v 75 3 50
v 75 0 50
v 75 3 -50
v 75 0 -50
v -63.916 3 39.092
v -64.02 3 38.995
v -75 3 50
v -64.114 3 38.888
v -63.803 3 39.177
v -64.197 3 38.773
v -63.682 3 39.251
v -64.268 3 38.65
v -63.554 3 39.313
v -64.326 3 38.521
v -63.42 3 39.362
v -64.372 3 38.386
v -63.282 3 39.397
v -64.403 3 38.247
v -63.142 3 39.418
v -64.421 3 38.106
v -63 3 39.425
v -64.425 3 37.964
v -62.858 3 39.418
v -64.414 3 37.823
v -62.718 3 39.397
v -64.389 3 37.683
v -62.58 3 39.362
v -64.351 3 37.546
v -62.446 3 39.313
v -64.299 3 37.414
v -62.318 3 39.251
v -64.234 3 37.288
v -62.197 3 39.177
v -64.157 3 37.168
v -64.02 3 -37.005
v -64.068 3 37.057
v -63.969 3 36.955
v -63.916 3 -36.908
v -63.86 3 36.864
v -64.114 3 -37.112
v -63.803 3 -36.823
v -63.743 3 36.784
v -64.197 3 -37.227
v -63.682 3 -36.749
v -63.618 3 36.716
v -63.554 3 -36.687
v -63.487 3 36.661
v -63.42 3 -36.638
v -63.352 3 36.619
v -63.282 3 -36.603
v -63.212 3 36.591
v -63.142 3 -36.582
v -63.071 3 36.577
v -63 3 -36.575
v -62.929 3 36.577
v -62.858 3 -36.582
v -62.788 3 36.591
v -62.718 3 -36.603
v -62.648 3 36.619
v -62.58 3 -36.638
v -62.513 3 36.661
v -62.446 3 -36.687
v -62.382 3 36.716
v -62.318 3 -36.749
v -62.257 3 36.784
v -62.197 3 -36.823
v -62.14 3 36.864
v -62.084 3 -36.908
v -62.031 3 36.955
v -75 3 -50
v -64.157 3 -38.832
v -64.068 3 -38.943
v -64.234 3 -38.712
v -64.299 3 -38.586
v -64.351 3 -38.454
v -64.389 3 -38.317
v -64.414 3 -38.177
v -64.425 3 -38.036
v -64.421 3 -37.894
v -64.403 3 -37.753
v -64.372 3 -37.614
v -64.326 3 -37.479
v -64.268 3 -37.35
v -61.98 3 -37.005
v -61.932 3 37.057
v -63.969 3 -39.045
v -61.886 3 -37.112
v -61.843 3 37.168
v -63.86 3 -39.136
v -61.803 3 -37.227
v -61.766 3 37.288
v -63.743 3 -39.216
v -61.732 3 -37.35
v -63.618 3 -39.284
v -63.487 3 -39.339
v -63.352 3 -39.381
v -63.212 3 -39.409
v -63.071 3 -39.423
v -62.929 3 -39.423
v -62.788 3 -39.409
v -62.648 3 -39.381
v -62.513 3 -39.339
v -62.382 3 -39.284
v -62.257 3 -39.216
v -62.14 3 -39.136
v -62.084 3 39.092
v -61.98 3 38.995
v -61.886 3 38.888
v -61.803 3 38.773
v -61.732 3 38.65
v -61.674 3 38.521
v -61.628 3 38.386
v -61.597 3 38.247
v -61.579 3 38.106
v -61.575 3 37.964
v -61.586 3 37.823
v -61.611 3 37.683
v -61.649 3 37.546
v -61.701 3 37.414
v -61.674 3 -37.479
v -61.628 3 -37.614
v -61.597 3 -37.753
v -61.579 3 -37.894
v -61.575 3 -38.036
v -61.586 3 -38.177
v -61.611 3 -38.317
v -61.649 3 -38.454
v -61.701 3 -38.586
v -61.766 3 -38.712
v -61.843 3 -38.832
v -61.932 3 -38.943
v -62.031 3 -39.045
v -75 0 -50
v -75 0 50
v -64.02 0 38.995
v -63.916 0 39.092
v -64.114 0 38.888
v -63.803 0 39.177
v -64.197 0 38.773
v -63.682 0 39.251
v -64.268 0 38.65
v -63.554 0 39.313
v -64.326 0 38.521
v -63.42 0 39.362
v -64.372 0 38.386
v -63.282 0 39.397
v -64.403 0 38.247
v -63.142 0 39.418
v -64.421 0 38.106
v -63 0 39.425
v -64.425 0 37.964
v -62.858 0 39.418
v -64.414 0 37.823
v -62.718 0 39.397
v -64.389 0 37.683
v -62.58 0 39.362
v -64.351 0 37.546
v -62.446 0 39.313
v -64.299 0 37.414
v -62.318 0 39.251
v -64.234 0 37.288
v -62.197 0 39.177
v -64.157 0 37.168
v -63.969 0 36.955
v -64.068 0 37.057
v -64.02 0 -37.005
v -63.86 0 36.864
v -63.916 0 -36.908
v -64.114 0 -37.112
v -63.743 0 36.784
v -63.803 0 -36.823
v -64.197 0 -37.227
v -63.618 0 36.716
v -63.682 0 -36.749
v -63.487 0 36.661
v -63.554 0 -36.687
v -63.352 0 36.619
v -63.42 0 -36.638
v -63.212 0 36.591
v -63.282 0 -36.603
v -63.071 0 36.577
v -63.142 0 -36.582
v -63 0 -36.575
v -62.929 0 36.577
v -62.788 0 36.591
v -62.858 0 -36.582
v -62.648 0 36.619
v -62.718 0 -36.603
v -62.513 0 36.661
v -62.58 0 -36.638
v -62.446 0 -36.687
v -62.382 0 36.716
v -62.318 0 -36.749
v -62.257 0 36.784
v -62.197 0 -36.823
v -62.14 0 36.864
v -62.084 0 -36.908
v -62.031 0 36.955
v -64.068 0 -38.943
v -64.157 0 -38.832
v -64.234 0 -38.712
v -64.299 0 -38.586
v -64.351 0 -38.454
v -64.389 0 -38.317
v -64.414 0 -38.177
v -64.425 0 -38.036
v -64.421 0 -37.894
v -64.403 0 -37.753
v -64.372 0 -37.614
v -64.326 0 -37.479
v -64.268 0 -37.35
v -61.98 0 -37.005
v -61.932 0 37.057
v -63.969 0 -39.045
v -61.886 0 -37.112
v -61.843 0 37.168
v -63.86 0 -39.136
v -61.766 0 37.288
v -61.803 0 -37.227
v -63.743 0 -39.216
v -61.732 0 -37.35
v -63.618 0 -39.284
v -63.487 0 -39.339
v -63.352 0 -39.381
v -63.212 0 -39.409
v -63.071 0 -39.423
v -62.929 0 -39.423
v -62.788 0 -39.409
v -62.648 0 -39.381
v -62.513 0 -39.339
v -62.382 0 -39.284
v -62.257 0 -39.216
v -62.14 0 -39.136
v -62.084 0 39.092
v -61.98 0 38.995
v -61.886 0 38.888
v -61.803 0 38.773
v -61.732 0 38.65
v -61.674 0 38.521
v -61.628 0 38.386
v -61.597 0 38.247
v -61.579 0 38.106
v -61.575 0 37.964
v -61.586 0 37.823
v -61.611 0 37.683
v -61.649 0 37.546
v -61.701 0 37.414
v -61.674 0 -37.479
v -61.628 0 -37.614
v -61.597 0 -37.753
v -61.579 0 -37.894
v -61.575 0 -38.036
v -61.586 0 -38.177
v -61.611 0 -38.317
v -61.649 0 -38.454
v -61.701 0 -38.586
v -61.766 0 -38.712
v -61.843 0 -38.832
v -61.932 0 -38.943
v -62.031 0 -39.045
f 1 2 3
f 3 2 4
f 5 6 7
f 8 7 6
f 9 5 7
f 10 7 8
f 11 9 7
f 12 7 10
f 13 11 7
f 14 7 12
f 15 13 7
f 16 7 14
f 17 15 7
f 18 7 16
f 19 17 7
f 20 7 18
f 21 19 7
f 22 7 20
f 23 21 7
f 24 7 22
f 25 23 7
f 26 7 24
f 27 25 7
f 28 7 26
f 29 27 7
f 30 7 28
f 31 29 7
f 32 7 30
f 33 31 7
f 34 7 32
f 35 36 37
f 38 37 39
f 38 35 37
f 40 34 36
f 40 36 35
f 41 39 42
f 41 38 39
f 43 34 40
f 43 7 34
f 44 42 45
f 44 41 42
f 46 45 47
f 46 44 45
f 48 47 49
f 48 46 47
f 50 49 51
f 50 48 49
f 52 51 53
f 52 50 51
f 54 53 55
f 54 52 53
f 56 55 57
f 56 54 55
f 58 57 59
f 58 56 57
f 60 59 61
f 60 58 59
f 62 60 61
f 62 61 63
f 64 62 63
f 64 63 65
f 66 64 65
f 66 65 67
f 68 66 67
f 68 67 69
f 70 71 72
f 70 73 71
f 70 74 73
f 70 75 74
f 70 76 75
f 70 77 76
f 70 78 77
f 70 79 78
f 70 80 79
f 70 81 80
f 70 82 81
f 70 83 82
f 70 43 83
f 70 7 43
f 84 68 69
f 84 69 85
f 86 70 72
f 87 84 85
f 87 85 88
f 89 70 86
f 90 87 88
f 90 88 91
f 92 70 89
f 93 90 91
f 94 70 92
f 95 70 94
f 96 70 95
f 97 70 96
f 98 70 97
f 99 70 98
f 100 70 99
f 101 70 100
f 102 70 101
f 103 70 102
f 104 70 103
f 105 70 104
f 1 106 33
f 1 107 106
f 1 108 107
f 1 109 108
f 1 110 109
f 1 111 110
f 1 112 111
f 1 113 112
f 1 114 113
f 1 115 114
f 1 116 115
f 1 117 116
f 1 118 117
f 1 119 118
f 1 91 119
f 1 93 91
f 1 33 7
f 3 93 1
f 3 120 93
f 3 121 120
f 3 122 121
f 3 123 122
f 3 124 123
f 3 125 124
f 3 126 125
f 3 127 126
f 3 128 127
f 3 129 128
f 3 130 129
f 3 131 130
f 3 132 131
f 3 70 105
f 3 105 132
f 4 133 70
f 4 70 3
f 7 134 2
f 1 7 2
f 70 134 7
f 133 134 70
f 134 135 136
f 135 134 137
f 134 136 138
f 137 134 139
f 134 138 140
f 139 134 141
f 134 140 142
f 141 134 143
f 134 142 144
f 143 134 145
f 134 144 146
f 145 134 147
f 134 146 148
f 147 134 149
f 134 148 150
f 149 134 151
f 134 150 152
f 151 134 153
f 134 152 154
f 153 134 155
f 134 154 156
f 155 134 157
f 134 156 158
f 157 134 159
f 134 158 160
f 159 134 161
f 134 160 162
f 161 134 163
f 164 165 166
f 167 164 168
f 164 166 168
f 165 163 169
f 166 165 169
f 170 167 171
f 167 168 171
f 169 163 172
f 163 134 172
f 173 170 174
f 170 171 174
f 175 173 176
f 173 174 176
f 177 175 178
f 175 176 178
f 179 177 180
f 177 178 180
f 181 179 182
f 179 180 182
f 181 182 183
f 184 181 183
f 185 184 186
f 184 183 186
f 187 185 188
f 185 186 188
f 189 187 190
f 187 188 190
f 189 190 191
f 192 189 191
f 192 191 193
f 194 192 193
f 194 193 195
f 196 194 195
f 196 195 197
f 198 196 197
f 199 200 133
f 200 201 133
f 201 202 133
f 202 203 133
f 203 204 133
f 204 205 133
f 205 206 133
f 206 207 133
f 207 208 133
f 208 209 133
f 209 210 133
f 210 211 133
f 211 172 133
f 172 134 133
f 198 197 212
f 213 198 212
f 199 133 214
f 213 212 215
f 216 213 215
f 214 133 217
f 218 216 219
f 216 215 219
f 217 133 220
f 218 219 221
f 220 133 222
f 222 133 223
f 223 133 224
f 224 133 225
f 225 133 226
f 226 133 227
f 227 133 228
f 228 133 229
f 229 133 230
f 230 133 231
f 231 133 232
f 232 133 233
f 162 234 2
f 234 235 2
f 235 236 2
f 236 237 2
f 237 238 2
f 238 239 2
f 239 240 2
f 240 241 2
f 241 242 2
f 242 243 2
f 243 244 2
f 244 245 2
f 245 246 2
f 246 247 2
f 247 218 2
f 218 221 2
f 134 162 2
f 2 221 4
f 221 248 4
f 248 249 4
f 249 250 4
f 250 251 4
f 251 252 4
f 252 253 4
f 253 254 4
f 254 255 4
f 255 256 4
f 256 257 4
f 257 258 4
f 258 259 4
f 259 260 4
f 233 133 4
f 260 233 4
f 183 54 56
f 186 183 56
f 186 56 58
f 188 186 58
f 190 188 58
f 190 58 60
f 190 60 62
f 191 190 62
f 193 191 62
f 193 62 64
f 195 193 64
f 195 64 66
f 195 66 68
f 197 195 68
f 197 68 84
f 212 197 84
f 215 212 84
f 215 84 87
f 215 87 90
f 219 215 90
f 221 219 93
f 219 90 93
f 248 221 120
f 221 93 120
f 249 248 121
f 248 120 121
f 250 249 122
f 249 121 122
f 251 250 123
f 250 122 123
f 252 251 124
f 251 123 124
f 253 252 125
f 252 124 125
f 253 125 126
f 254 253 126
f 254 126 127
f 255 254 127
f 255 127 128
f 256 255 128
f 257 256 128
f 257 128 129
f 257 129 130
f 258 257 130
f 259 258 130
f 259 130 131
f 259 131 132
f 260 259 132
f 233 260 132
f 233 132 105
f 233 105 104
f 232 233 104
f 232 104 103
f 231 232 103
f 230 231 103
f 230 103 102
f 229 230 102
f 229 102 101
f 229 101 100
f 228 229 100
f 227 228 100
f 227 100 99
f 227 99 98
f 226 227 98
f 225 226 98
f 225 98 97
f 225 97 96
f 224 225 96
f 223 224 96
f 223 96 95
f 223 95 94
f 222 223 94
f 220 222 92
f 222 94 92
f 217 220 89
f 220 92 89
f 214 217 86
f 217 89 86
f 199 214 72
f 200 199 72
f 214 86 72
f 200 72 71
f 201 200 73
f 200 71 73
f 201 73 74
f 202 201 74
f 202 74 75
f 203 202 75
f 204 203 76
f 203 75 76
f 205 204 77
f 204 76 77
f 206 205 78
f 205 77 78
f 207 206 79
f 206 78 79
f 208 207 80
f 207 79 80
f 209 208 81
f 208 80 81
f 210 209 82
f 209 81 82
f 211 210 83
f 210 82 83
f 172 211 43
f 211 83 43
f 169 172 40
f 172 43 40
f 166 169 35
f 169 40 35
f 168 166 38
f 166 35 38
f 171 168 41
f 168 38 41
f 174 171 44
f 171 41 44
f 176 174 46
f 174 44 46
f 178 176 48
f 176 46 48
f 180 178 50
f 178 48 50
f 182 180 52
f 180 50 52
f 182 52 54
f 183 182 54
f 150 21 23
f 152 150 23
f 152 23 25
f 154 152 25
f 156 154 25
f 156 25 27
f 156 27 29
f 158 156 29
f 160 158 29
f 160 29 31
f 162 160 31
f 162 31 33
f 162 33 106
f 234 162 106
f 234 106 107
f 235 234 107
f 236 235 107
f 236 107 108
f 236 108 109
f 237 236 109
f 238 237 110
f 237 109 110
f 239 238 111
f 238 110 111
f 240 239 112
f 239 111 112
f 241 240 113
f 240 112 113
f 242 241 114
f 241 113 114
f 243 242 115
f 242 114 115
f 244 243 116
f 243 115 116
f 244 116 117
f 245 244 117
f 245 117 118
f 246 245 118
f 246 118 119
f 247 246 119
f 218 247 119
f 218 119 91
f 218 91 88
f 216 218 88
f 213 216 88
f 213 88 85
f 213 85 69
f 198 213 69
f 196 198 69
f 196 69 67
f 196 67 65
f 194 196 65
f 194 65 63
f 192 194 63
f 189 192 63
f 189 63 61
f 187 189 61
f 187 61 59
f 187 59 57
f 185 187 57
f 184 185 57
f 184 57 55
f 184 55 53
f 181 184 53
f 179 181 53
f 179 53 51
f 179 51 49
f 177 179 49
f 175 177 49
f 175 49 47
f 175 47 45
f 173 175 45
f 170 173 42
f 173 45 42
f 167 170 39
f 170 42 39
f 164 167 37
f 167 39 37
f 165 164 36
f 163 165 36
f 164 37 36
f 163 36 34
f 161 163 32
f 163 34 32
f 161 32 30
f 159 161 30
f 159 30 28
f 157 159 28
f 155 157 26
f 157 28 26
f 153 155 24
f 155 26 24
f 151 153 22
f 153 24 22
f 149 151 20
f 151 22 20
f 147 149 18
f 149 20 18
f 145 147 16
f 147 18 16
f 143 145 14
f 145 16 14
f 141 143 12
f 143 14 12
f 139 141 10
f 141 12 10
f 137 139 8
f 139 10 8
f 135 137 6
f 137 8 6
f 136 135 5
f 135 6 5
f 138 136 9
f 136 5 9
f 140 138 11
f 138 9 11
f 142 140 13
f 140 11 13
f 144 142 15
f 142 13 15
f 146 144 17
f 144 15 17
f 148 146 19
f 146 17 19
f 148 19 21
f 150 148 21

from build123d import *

# Parameters (mm, degrees)
SKETCH1_W           = 150
SKETCH1_H           = 100
BOSS_EXTRUDE1_DEPTH = 3
SKETCH2_R           = 1.425
CUT_EXTRUDE1_DEPTH  = 10
LPATTERN1_COUNT     = 2
LPATTERN1_PITCH     = 76


with BuildPart() as part:
    # Sketch1 → Boss-Extrude1 (new body)
    with BuildSketch(Plane(origin=(0, 0, 0), x_dir=(1, 0, 0), z_dir=(0, 1, 0))):
        Rectangle(SKETCH1_W, SKETCH1_H)
    extrude(amount=BOSS_EXTRUDE1_DEPTH)

    # Sketch2 → Cut-Extrude1 (cut)
    with BuildSketch(Plane(origin=(0, 3, 0), x_dir=(1, 0, 0), z_dir=(0, 1, 0))):
        with Locations(Location((-63, 38, 0), (0, 0, 270))):
            Circle(SKETCH2_R)
    cut_extrude1 = extrude(amount=-CUT_EXTRUDE1_DEPTH, mode=Mode.SUBTRACT)

    # LPattern1: Cut-Extrude1 ×2
    with Locations(*[(0, 0, i * LPATTERN1_PITCH) for i in range(1, LPATTERN1_COUNT)]):
        add(cut_extrude1, mode=Mode.SUBTRACT)


solid = part.part
